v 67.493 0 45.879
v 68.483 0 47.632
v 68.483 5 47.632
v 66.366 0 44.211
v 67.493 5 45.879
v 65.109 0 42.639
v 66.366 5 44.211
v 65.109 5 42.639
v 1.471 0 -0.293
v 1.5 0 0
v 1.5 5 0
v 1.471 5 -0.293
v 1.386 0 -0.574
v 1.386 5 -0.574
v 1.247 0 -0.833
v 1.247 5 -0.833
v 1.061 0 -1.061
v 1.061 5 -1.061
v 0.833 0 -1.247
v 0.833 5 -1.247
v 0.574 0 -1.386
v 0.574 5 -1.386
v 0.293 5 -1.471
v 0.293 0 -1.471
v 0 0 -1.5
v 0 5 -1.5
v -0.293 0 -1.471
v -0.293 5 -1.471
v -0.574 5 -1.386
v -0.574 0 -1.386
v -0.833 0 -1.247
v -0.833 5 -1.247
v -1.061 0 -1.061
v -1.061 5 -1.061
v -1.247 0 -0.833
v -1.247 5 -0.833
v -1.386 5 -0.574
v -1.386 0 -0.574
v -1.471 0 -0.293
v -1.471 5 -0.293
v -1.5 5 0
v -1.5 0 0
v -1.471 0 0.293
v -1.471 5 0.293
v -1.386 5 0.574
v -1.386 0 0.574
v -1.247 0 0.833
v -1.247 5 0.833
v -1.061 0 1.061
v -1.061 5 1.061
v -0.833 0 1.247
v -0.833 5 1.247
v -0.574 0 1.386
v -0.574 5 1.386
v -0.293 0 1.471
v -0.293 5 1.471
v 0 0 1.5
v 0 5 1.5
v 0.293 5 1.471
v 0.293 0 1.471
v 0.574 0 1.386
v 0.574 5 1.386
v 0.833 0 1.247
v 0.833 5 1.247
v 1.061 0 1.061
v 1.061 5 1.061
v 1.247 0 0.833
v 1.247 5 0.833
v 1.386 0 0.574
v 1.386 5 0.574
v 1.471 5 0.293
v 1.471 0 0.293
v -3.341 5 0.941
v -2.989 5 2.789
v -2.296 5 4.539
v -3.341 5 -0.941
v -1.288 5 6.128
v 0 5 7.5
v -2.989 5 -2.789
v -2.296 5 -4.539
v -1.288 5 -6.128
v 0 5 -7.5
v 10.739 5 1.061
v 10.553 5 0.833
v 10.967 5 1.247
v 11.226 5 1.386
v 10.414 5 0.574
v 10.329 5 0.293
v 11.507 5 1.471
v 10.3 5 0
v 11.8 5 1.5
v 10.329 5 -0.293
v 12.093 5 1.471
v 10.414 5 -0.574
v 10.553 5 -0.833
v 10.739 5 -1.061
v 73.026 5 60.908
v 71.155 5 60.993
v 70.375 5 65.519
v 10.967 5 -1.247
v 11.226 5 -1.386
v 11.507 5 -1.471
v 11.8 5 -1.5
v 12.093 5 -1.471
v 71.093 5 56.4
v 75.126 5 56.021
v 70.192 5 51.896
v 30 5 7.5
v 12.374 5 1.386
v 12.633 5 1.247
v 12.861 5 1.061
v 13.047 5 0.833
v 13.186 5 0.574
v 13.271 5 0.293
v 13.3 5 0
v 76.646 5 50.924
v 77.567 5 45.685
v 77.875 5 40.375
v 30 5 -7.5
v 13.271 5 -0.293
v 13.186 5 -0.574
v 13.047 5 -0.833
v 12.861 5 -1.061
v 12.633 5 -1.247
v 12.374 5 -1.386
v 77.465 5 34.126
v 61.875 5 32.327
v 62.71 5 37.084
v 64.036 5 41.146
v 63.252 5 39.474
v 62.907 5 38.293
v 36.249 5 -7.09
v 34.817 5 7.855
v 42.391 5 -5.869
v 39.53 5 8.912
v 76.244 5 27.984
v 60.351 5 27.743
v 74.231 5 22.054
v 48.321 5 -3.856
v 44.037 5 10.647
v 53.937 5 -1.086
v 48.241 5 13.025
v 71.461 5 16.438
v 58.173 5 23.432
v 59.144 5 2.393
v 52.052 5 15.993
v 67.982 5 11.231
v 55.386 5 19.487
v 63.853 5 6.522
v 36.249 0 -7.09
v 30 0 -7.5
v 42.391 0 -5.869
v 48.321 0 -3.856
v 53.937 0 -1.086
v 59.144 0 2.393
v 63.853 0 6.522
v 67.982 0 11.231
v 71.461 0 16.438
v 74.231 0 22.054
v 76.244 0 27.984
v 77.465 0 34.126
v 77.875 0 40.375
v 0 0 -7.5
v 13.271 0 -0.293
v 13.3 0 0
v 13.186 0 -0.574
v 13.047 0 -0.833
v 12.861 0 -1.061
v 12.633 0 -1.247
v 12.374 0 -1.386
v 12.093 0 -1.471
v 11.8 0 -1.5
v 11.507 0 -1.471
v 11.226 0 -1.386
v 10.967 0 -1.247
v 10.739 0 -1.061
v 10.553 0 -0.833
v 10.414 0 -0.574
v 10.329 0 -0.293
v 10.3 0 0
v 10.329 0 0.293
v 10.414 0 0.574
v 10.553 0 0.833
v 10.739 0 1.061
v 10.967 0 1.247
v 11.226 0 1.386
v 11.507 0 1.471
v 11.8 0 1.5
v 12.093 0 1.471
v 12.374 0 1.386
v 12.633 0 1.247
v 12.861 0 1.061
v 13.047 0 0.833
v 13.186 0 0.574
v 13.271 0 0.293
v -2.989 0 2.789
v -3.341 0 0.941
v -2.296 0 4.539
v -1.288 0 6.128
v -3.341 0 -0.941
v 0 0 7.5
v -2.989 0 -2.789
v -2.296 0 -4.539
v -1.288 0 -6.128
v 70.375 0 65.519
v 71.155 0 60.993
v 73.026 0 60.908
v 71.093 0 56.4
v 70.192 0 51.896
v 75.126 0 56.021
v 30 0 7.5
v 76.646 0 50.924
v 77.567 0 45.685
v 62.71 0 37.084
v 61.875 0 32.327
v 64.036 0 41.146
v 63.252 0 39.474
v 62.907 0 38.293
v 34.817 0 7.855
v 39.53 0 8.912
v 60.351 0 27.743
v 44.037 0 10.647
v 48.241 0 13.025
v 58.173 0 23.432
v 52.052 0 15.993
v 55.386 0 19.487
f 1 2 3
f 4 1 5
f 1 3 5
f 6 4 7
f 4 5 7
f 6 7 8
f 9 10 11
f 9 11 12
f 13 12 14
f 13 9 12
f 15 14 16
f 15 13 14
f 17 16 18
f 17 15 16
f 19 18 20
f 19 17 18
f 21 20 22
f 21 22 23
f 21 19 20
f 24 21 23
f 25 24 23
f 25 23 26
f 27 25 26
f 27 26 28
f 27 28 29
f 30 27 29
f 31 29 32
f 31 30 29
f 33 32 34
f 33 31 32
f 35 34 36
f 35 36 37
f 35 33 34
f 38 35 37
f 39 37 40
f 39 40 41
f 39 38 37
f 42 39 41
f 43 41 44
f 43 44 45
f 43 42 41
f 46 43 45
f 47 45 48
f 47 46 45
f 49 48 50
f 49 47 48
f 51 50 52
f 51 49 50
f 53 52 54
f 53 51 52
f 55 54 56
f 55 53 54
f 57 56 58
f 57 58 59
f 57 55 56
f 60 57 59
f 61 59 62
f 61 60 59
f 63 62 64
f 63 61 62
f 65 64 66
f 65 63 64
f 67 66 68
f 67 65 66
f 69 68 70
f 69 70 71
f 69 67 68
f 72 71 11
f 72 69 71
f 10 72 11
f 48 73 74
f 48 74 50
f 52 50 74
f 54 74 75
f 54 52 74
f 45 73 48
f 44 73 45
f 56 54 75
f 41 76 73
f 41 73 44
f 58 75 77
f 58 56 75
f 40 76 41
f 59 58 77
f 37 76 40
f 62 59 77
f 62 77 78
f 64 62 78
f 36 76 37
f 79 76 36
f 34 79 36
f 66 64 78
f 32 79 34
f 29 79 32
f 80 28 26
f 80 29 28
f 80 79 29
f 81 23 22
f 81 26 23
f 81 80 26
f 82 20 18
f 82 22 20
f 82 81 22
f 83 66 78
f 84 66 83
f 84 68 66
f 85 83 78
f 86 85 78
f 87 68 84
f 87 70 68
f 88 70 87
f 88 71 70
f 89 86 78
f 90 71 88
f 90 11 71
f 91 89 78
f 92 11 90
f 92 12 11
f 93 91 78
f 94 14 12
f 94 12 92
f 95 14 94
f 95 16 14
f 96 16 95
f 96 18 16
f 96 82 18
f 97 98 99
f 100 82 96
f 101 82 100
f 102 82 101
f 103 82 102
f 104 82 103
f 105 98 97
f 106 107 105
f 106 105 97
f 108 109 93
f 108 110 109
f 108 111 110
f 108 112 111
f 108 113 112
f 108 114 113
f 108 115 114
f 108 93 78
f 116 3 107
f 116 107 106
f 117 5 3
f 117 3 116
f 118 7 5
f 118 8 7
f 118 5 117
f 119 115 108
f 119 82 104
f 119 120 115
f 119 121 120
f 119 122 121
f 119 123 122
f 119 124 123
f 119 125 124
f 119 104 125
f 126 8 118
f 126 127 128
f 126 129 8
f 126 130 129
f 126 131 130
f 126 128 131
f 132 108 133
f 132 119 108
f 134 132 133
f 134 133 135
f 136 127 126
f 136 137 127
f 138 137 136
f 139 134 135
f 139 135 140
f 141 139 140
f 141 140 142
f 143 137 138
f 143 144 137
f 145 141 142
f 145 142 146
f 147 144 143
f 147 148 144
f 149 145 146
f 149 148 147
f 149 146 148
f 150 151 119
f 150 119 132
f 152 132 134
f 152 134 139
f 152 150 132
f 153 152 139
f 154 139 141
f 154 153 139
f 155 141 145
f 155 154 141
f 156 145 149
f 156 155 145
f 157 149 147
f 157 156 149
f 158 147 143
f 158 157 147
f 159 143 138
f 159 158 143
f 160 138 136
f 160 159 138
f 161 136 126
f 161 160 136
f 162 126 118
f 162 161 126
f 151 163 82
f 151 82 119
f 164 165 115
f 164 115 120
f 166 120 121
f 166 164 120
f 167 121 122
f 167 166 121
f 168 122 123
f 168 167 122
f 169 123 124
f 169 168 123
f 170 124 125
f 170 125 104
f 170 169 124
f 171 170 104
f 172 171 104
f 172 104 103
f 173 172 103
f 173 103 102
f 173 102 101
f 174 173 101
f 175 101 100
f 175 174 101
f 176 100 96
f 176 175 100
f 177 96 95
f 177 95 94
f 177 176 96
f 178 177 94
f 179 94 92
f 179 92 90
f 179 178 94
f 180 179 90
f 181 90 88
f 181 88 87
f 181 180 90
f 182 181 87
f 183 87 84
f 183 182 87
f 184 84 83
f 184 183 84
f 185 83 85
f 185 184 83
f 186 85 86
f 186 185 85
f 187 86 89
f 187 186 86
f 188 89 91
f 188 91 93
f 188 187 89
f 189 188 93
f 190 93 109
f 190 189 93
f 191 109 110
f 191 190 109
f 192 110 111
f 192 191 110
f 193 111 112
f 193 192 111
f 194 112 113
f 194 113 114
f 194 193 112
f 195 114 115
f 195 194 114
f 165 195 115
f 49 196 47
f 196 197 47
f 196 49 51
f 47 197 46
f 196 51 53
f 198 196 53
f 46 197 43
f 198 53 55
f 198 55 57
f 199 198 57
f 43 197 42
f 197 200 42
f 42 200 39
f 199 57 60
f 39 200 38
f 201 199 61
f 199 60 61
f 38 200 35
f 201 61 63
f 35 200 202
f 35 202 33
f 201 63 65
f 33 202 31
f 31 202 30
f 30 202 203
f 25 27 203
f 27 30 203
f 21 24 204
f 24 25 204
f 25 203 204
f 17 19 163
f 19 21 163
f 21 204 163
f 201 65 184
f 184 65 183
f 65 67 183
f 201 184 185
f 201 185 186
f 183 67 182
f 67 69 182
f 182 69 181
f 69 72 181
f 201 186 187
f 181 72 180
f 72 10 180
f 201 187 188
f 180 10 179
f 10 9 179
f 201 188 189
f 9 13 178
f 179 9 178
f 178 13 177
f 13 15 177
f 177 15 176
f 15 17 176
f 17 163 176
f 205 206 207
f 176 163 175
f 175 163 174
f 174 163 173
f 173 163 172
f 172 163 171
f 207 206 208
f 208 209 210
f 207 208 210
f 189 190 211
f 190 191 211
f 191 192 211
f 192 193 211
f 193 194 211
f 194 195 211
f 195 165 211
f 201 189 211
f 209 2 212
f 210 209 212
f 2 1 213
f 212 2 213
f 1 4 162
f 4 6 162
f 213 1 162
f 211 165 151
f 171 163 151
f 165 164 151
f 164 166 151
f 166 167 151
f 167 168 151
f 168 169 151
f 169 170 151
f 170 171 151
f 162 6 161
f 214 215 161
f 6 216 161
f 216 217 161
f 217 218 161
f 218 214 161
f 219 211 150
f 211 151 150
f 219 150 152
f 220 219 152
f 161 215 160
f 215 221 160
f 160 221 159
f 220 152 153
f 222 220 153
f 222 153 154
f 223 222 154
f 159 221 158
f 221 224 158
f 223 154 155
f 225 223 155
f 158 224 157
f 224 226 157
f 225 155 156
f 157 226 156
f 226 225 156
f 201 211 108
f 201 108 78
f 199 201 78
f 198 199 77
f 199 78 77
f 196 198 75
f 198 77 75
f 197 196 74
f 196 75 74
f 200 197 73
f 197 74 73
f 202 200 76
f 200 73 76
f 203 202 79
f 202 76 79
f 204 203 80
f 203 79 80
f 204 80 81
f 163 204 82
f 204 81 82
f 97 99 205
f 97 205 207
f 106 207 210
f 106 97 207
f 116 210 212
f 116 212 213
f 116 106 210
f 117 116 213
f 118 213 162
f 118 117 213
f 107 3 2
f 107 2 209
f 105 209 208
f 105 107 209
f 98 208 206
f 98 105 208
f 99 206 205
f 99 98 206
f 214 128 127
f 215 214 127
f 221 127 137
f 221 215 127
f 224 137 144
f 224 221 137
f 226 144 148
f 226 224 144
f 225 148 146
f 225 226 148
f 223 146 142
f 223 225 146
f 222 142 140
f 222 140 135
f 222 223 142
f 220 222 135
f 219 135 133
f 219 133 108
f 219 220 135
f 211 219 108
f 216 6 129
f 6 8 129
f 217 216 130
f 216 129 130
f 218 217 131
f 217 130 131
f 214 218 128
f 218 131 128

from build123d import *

# Parameters (mm, degrees)
SKETCH1_R           = 1.5
BOSS_EXTRUDE1_DEPTH = 5
CUT_EXTRUDE1_DEPTH  = 10
BOSS_EXTRUDE2_DEPTH = 5
CUT_EXTRUDE2_DEPTH  = 10
FILLET1_R           = 10


with BuildPart() as part:
    # Sketch1 → Boss-Extrude1 (new body)
    with BuildSketch(Plane(origin=(0, 0, 0), x_dir=(1, 0, 0), z_dir=(0, 1, 0))):
        with BuildLine():
            ThreePointArc((30, 7.5), (22.5, 0), (30, -7.5))
            Line((30, -7.5), (0, -7.5))
            ThreePointArc((0, -7.5), (-7.5, 0), (0, 7.5))
            Line((0, 7.5), (30, 7.5))
        make_face()
        with Locations((11.8, 0)):
            Circle(SKETCH1_R, mode=Mode.SUBTRACT)
        Circle(SKETCH1_R, mode=Mode.SUBTRACT)
        with BuildLine():
            ThreePointArc((30, -7.5), (37.5, 0), (30, 7.5))
            ThreePointArc((30, 7.5), (22.5, 0), (30, -7.5))
        make_face()
        with BuildLine():
            ThreePointArc((62.875, -40.375), (53.246135432, -17.128864568), (30, -7.5))
            ThreePointArc((30, -7.5), (37.5, 0), (30, 7.5))
            ThreePointArc((30, 7.5), (63.852737149, -6.522262851), (77.875, -40.375))
            ThreePointArc((77.875, -40.375), (70.375, -47.875), (62.875, -40.375))
        make_face()
    extrude(amount=BOSS_EXTRUDE1_DEPTH)

    # Sketch2 → Cut-Extrude1 (cut)
    with BuildSketch(Plane(origin=(0, 5, 0), x_dir=(1, 0, 0), z_dir=(0, 1, 0))):
        with BuildLine():
            ThreePointArc((0, 7.5), (-7.5, 0), (0, -7.5))
            ThreePointArc((0, -7.5), (-3.385621722, 0), (0, 7.5))
        make_face()
    extrude(amount=-CUT_EXTRUDE1_DEPTH, mode=Mode.SUBTRACT)

    # Sketch3 → Boss-Extrude2 (add)
    with BuildSketch(Plane(origin=(0, 5, 0), x_dir=(1, 0, 0), z_dir=(0, 1, 0))):
        with BuildLine():
            ThreePointArc((77.875, -40.375), (74.960699845, -46.309758372), (68.482638152, -47.632338812))
            ThreePointArc((68.482638152, -47.632338812), (71.093194767, -56.399789932), (70.375, -65.519406222))
            ThreePointArc((70.375, -65.519406222), (75.960053745, -53.494557579), (77.875, -40.375))
        make_face()
    extrude(amount=-BOSS_EXTRUDE2_DEPTH)

    # Sketch4 → Cut-Extrude2 (cut)
    with BuildSketch(Plane(origin=(0, 5, 0), x_dir=(1, 0, 0), z_dir=(0, 1, 0))):
        with BuildLine():
            ThreePointArc((62.875, -40.375), (64.440241628, -44.960699845), (68.482638152, -47.632338812))
            ThreePointArc((68.482638152, -47.632338812), (66.014466289, -43.744319779), (62.875, -40.375))
        make_face()
    extrude(amount=-CUT_EXTRUDE2_DEPTH, mode=Mode.SUBTRACT)

    # Fillet1
    fillet1_edges = [part.edges().sort_by_distance(p)[0] for p in [
        (62.875, 2.5, 40.375),
    ]]
    fillet(fillet1_edges, radius=FILLET1_R)


solid = part.part
